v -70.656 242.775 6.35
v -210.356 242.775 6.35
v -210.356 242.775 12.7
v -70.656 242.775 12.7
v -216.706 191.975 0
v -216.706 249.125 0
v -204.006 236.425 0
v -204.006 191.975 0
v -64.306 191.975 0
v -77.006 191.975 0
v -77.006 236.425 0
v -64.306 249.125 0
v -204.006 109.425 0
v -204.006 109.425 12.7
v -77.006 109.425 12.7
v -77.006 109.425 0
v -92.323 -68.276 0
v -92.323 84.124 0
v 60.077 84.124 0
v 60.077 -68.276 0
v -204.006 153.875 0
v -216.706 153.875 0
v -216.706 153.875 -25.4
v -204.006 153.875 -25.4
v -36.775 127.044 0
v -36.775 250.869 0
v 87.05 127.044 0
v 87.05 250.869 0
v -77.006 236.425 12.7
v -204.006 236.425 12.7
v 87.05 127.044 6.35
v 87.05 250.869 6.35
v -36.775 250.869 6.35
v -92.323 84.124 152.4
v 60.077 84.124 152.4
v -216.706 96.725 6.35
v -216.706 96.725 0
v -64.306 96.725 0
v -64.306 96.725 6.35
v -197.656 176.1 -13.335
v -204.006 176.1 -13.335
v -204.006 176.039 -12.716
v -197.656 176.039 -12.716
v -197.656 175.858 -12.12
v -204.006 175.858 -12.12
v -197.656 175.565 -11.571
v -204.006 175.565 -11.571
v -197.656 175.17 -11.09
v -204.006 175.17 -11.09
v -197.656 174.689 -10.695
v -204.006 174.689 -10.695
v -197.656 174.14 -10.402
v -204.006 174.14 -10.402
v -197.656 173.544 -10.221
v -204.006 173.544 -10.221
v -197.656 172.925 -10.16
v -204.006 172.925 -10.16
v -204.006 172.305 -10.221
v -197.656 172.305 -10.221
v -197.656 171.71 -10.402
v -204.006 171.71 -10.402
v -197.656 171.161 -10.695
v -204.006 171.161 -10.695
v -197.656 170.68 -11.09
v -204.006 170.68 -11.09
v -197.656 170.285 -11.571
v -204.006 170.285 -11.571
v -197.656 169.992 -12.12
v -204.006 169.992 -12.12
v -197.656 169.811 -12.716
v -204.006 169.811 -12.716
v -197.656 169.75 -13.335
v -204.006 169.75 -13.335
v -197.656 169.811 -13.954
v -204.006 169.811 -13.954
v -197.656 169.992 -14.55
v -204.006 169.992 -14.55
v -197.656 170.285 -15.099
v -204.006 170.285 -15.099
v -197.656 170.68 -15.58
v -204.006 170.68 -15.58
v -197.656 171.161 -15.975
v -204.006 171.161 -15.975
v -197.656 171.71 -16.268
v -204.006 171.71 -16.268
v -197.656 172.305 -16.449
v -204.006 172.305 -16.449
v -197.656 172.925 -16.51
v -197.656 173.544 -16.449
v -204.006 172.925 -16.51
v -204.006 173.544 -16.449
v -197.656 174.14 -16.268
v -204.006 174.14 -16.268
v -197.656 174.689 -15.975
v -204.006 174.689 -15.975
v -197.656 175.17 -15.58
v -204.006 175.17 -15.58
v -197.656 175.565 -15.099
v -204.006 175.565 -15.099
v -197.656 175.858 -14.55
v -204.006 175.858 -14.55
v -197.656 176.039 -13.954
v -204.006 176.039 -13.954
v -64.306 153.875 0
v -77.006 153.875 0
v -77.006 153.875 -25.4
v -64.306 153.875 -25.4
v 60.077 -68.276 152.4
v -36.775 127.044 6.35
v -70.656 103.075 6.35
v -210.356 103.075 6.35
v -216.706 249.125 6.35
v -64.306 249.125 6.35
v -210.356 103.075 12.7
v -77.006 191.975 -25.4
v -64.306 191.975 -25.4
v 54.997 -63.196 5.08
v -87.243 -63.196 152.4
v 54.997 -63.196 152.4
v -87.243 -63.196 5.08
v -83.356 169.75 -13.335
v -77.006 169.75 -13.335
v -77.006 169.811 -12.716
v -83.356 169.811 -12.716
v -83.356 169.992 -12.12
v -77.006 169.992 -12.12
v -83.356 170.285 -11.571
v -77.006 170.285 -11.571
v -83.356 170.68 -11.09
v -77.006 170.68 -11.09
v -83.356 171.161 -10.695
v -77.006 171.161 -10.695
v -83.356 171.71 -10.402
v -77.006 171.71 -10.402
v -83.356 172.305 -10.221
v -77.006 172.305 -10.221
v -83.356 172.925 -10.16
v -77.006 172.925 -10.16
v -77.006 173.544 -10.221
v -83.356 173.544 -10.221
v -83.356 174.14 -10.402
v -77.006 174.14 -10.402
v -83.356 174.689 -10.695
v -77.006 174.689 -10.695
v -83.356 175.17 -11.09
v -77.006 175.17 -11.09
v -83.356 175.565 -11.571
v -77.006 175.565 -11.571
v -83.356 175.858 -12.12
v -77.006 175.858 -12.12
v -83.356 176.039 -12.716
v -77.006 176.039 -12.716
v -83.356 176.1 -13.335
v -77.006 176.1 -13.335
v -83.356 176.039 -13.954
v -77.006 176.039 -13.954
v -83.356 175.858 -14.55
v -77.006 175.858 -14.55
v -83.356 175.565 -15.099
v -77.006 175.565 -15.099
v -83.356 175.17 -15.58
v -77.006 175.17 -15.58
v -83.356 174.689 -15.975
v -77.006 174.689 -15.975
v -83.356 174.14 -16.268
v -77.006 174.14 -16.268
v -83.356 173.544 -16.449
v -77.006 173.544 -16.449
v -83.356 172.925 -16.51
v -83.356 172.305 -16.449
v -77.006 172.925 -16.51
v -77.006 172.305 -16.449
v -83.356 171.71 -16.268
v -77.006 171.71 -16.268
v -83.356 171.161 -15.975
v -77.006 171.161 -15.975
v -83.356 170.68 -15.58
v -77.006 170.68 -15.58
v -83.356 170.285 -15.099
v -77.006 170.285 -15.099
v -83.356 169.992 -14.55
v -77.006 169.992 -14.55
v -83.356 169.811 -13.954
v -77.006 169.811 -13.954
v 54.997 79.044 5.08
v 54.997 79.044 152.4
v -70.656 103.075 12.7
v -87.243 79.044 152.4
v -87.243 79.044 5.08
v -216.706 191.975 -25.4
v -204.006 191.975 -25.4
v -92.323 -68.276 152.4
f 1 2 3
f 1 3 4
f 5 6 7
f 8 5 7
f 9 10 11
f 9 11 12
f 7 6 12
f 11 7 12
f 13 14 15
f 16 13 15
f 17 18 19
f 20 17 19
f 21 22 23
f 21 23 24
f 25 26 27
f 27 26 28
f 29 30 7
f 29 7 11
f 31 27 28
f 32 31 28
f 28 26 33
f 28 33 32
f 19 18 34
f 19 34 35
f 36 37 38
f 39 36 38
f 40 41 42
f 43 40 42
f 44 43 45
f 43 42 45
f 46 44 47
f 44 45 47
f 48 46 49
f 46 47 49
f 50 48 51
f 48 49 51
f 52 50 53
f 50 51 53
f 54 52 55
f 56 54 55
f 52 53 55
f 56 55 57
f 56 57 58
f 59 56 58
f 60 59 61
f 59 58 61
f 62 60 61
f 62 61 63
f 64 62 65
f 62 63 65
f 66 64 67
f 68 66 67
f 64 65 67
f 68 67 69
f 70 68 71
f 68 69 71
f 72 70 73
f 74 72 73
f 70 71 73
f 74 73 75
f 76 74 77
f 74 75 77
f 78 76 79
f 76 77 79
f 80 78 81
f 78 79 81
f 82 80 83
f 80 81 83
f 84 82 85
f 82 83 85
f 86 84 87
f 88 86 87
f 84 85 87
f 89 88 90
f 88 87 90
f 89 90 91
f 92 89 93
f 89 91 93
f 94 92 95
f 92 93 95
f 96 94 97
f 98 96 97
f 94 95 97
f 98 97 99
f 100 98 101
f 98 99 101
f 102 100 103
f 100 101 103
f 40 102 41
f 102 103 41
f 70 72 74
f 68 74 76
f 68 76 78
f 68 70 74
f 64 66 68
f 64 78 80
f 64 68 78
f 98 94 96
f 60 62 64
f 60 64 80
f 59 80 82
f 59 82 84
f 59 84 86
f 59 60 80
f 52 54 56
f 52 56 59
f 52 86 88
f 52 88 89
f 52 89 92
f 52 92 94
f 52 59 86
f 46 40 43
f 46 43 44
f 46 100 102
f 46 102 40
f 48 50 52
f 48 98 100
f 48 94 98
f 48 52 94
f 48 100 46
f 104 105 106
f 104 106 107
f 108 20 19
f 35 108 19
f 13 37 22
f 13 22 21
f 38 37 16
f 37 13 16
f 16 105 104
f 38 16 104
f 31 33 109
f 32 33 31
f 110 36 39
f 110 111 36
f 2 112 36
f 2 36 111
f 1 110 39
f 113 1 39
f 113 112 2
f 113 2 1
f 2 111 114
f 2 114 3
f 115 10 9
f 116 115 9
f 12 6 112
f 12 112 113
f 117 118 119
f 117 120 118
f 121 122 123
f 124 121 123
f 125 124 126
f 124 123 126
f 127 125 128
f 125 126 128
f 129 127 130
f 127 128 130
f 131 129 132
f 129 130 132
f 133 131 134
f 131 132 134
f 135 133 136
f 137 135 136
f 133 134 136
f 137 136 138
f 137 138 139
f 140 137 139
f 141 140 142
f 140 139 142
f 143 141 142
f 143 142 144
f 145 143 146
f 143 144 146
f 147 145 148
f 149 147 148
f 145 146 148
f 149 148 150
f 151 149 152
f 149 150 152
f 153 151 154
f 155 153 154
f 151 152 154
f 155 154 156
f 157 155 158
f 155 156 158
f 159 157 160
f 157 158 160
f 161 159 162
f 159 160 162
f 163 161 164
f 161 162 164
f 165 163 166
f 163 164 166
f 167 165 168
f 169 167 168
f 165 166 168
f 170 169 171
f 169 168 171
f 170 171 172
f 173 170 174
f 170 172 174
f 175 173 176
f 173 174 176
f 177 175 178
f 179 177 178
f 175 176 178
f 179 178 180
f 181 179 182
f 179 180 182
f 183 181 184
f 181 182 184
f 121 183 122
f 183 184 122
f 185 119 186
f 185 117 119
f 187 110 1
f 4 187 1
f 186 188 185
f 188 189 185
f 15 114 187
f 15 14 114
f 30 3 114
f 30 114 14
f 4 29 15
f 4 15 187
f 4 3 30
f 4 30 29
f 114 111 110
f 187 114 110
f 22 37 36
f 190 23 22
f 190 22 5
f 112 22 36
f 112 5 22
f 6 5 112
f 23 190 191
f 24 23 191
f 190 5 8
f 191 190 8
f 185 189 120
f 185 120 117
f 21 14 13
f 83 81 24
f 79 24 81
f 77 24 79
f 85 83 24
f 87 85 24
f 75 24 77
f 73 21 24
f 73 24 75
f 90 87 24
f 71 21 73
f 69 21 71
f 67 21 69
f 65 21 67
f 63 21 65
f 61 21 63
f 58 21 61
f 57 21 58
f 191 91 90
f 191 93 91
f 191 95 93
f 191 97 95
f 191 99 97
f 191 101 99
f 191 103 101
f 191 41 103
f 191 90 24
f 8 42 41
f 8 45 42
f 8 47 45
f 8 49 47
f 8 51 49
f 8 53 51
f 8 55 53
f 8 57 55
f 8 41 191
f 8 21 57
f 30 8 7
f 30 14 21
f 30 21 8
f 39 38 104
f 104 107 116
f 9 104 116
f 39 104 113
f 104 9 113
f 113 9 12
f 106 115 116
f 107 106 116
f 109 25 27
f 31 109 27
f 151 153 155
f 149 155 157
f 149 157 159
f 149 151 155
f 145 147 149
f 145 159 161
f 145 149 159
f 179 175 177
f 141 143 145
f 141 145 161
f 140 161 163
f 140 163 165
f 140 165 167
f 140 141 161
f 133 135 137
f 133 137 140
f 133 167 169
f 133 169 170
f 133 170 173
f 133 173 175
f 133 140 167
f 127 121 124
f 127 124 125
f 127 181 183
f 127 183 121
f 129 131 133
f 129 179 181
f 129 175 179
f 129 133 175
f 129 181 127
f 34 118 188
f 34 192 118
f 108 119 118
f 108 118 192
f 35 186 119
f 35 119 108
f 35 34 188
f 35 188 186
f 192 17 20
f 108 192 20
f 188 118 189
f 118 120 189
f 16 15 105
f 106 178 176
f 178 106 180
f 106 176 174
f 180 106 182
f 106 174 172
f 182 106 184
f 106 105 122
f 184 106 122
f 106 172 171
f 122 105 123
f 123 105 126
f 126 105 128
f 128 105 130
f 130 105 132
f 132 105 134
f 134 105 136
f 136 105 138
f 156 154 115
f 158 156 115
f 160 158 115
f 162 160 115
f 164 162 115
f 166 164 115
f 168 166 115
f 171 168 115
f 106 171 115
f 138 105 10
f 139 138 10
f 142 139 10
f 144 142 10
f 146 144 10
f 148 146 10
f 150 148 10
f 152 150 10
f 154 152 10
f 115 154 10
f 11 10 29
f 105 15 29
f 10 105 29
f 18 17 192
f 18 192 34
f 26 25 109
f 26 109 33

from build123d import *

# Parameters (mm, degrees)
F0_W      = 152.4
F0_H      = 152.4
F1_DEPTH  = 152.4
F2_T      = -5.08
F3_W      = 152.4
F3_H      = 152.4
F4_DEPTH  = 6.35
F5_W      = 139.7
F5_H      = 139.7
F6_DEPTH  = 6.35
F7_W      = 127
F7_H      = 127
F8_DEPTH  = 25.4
F9_W      = 12.7
F9_H      = 38.1
F10_DEPTH = 25.4
F11_R     = 3.175
F13_DEPTH = 6.35
F12_R     = 3.175
F14_DEPTH = 6.35
F15_W     = 123.825
F15_H     = 123.825
F16_DEPTH = 6.35


with BuildPart() as f1:
    # F0 (on Top) → F1 (new body)
    with BuildSketch(Plane.XY):
        with Locations((-16.12282, 7.924423)):
            Rectangle(F0_W, F0_H)
    extrude(amount=F1_DEPTH)

    # F2
    f2_openings = [f1.faces().sort_by_distance(p)[0] for p in [
        (-16.12282, 7.924423, 152.4),
    ]]
    offset(amount=F2_T, openings=f2_openings)


with BuildPart() as f4:
    # F3 (on Top) → F4 (new body)
    with BuildSketch(Plane.XY):
        with Locations((-140.50642, 172.924861)):
            Rectangle(F3_W, F3_H)
    extrude(amount=F4_DEPTH)

    # F5 (on face) → F6 (join)
    with BuildSketch(Plane.XY.offset(6.35)):
        with Locations((-140.50642, 172.924861)):
            Rectangle(F5_W, F5_H)
    extrude(amount=F6_DEPTH)

    # F7 (on face) → F8 (cut)
    with BuildSketch(Plane.XY.offset(12.7)):
        with Locations((-140.50642, 172.924861)):
            Rectangle(F7_W, F7_H)
    extrude(amount=-F8_DEPTH, mode=Mode.SUBTRACT)

    # F9 (on face) → F10 (join)
    with BuildSketch(Plane(origin=(0, 0, 0), x_dir=(1, 0, 0), z_dir=(0, 0, -1))):
        with Locations((-210.35642, -172.924861)):
            Rectangle(F9_W, F9_H)
        with Locations((-70.65642, -172.924861)):
            Rectangle(F9_W, F9_H)
    extrude(amount=F10_DEPTH)

    # F11 (on face) → F13 (join)
    with BuildSketch(Plane(origin=(-77.00642, 0, 0), x_dir=(0, -1, 0), z_dir=(-1, 0, 0))):
        with Locations((-172.924861, -13.335)):
            Circle(F11_R)
    extrude(amount=F13_DEPTH)

    # F12 (on face) → F14 (join)
    with BuildSketch(Plane.YZ.offset(-204.00642)):
        with Locations((172.924861, -13.335)):
            Circle(F12_R)
    extrude(amount=F14_DEPTH)


with BuildPart() as f16:
    # F15 (on Top) → F16 (new body)
    with BuildSketch(Plane.XY):
        with Locations((25.137921, 188.956312)):
            Rectangle(F15_W, F15_H)
    extrude(amount=F16_DEPTH)


solid = Compound([f1.part, f4.part, f16.part])
